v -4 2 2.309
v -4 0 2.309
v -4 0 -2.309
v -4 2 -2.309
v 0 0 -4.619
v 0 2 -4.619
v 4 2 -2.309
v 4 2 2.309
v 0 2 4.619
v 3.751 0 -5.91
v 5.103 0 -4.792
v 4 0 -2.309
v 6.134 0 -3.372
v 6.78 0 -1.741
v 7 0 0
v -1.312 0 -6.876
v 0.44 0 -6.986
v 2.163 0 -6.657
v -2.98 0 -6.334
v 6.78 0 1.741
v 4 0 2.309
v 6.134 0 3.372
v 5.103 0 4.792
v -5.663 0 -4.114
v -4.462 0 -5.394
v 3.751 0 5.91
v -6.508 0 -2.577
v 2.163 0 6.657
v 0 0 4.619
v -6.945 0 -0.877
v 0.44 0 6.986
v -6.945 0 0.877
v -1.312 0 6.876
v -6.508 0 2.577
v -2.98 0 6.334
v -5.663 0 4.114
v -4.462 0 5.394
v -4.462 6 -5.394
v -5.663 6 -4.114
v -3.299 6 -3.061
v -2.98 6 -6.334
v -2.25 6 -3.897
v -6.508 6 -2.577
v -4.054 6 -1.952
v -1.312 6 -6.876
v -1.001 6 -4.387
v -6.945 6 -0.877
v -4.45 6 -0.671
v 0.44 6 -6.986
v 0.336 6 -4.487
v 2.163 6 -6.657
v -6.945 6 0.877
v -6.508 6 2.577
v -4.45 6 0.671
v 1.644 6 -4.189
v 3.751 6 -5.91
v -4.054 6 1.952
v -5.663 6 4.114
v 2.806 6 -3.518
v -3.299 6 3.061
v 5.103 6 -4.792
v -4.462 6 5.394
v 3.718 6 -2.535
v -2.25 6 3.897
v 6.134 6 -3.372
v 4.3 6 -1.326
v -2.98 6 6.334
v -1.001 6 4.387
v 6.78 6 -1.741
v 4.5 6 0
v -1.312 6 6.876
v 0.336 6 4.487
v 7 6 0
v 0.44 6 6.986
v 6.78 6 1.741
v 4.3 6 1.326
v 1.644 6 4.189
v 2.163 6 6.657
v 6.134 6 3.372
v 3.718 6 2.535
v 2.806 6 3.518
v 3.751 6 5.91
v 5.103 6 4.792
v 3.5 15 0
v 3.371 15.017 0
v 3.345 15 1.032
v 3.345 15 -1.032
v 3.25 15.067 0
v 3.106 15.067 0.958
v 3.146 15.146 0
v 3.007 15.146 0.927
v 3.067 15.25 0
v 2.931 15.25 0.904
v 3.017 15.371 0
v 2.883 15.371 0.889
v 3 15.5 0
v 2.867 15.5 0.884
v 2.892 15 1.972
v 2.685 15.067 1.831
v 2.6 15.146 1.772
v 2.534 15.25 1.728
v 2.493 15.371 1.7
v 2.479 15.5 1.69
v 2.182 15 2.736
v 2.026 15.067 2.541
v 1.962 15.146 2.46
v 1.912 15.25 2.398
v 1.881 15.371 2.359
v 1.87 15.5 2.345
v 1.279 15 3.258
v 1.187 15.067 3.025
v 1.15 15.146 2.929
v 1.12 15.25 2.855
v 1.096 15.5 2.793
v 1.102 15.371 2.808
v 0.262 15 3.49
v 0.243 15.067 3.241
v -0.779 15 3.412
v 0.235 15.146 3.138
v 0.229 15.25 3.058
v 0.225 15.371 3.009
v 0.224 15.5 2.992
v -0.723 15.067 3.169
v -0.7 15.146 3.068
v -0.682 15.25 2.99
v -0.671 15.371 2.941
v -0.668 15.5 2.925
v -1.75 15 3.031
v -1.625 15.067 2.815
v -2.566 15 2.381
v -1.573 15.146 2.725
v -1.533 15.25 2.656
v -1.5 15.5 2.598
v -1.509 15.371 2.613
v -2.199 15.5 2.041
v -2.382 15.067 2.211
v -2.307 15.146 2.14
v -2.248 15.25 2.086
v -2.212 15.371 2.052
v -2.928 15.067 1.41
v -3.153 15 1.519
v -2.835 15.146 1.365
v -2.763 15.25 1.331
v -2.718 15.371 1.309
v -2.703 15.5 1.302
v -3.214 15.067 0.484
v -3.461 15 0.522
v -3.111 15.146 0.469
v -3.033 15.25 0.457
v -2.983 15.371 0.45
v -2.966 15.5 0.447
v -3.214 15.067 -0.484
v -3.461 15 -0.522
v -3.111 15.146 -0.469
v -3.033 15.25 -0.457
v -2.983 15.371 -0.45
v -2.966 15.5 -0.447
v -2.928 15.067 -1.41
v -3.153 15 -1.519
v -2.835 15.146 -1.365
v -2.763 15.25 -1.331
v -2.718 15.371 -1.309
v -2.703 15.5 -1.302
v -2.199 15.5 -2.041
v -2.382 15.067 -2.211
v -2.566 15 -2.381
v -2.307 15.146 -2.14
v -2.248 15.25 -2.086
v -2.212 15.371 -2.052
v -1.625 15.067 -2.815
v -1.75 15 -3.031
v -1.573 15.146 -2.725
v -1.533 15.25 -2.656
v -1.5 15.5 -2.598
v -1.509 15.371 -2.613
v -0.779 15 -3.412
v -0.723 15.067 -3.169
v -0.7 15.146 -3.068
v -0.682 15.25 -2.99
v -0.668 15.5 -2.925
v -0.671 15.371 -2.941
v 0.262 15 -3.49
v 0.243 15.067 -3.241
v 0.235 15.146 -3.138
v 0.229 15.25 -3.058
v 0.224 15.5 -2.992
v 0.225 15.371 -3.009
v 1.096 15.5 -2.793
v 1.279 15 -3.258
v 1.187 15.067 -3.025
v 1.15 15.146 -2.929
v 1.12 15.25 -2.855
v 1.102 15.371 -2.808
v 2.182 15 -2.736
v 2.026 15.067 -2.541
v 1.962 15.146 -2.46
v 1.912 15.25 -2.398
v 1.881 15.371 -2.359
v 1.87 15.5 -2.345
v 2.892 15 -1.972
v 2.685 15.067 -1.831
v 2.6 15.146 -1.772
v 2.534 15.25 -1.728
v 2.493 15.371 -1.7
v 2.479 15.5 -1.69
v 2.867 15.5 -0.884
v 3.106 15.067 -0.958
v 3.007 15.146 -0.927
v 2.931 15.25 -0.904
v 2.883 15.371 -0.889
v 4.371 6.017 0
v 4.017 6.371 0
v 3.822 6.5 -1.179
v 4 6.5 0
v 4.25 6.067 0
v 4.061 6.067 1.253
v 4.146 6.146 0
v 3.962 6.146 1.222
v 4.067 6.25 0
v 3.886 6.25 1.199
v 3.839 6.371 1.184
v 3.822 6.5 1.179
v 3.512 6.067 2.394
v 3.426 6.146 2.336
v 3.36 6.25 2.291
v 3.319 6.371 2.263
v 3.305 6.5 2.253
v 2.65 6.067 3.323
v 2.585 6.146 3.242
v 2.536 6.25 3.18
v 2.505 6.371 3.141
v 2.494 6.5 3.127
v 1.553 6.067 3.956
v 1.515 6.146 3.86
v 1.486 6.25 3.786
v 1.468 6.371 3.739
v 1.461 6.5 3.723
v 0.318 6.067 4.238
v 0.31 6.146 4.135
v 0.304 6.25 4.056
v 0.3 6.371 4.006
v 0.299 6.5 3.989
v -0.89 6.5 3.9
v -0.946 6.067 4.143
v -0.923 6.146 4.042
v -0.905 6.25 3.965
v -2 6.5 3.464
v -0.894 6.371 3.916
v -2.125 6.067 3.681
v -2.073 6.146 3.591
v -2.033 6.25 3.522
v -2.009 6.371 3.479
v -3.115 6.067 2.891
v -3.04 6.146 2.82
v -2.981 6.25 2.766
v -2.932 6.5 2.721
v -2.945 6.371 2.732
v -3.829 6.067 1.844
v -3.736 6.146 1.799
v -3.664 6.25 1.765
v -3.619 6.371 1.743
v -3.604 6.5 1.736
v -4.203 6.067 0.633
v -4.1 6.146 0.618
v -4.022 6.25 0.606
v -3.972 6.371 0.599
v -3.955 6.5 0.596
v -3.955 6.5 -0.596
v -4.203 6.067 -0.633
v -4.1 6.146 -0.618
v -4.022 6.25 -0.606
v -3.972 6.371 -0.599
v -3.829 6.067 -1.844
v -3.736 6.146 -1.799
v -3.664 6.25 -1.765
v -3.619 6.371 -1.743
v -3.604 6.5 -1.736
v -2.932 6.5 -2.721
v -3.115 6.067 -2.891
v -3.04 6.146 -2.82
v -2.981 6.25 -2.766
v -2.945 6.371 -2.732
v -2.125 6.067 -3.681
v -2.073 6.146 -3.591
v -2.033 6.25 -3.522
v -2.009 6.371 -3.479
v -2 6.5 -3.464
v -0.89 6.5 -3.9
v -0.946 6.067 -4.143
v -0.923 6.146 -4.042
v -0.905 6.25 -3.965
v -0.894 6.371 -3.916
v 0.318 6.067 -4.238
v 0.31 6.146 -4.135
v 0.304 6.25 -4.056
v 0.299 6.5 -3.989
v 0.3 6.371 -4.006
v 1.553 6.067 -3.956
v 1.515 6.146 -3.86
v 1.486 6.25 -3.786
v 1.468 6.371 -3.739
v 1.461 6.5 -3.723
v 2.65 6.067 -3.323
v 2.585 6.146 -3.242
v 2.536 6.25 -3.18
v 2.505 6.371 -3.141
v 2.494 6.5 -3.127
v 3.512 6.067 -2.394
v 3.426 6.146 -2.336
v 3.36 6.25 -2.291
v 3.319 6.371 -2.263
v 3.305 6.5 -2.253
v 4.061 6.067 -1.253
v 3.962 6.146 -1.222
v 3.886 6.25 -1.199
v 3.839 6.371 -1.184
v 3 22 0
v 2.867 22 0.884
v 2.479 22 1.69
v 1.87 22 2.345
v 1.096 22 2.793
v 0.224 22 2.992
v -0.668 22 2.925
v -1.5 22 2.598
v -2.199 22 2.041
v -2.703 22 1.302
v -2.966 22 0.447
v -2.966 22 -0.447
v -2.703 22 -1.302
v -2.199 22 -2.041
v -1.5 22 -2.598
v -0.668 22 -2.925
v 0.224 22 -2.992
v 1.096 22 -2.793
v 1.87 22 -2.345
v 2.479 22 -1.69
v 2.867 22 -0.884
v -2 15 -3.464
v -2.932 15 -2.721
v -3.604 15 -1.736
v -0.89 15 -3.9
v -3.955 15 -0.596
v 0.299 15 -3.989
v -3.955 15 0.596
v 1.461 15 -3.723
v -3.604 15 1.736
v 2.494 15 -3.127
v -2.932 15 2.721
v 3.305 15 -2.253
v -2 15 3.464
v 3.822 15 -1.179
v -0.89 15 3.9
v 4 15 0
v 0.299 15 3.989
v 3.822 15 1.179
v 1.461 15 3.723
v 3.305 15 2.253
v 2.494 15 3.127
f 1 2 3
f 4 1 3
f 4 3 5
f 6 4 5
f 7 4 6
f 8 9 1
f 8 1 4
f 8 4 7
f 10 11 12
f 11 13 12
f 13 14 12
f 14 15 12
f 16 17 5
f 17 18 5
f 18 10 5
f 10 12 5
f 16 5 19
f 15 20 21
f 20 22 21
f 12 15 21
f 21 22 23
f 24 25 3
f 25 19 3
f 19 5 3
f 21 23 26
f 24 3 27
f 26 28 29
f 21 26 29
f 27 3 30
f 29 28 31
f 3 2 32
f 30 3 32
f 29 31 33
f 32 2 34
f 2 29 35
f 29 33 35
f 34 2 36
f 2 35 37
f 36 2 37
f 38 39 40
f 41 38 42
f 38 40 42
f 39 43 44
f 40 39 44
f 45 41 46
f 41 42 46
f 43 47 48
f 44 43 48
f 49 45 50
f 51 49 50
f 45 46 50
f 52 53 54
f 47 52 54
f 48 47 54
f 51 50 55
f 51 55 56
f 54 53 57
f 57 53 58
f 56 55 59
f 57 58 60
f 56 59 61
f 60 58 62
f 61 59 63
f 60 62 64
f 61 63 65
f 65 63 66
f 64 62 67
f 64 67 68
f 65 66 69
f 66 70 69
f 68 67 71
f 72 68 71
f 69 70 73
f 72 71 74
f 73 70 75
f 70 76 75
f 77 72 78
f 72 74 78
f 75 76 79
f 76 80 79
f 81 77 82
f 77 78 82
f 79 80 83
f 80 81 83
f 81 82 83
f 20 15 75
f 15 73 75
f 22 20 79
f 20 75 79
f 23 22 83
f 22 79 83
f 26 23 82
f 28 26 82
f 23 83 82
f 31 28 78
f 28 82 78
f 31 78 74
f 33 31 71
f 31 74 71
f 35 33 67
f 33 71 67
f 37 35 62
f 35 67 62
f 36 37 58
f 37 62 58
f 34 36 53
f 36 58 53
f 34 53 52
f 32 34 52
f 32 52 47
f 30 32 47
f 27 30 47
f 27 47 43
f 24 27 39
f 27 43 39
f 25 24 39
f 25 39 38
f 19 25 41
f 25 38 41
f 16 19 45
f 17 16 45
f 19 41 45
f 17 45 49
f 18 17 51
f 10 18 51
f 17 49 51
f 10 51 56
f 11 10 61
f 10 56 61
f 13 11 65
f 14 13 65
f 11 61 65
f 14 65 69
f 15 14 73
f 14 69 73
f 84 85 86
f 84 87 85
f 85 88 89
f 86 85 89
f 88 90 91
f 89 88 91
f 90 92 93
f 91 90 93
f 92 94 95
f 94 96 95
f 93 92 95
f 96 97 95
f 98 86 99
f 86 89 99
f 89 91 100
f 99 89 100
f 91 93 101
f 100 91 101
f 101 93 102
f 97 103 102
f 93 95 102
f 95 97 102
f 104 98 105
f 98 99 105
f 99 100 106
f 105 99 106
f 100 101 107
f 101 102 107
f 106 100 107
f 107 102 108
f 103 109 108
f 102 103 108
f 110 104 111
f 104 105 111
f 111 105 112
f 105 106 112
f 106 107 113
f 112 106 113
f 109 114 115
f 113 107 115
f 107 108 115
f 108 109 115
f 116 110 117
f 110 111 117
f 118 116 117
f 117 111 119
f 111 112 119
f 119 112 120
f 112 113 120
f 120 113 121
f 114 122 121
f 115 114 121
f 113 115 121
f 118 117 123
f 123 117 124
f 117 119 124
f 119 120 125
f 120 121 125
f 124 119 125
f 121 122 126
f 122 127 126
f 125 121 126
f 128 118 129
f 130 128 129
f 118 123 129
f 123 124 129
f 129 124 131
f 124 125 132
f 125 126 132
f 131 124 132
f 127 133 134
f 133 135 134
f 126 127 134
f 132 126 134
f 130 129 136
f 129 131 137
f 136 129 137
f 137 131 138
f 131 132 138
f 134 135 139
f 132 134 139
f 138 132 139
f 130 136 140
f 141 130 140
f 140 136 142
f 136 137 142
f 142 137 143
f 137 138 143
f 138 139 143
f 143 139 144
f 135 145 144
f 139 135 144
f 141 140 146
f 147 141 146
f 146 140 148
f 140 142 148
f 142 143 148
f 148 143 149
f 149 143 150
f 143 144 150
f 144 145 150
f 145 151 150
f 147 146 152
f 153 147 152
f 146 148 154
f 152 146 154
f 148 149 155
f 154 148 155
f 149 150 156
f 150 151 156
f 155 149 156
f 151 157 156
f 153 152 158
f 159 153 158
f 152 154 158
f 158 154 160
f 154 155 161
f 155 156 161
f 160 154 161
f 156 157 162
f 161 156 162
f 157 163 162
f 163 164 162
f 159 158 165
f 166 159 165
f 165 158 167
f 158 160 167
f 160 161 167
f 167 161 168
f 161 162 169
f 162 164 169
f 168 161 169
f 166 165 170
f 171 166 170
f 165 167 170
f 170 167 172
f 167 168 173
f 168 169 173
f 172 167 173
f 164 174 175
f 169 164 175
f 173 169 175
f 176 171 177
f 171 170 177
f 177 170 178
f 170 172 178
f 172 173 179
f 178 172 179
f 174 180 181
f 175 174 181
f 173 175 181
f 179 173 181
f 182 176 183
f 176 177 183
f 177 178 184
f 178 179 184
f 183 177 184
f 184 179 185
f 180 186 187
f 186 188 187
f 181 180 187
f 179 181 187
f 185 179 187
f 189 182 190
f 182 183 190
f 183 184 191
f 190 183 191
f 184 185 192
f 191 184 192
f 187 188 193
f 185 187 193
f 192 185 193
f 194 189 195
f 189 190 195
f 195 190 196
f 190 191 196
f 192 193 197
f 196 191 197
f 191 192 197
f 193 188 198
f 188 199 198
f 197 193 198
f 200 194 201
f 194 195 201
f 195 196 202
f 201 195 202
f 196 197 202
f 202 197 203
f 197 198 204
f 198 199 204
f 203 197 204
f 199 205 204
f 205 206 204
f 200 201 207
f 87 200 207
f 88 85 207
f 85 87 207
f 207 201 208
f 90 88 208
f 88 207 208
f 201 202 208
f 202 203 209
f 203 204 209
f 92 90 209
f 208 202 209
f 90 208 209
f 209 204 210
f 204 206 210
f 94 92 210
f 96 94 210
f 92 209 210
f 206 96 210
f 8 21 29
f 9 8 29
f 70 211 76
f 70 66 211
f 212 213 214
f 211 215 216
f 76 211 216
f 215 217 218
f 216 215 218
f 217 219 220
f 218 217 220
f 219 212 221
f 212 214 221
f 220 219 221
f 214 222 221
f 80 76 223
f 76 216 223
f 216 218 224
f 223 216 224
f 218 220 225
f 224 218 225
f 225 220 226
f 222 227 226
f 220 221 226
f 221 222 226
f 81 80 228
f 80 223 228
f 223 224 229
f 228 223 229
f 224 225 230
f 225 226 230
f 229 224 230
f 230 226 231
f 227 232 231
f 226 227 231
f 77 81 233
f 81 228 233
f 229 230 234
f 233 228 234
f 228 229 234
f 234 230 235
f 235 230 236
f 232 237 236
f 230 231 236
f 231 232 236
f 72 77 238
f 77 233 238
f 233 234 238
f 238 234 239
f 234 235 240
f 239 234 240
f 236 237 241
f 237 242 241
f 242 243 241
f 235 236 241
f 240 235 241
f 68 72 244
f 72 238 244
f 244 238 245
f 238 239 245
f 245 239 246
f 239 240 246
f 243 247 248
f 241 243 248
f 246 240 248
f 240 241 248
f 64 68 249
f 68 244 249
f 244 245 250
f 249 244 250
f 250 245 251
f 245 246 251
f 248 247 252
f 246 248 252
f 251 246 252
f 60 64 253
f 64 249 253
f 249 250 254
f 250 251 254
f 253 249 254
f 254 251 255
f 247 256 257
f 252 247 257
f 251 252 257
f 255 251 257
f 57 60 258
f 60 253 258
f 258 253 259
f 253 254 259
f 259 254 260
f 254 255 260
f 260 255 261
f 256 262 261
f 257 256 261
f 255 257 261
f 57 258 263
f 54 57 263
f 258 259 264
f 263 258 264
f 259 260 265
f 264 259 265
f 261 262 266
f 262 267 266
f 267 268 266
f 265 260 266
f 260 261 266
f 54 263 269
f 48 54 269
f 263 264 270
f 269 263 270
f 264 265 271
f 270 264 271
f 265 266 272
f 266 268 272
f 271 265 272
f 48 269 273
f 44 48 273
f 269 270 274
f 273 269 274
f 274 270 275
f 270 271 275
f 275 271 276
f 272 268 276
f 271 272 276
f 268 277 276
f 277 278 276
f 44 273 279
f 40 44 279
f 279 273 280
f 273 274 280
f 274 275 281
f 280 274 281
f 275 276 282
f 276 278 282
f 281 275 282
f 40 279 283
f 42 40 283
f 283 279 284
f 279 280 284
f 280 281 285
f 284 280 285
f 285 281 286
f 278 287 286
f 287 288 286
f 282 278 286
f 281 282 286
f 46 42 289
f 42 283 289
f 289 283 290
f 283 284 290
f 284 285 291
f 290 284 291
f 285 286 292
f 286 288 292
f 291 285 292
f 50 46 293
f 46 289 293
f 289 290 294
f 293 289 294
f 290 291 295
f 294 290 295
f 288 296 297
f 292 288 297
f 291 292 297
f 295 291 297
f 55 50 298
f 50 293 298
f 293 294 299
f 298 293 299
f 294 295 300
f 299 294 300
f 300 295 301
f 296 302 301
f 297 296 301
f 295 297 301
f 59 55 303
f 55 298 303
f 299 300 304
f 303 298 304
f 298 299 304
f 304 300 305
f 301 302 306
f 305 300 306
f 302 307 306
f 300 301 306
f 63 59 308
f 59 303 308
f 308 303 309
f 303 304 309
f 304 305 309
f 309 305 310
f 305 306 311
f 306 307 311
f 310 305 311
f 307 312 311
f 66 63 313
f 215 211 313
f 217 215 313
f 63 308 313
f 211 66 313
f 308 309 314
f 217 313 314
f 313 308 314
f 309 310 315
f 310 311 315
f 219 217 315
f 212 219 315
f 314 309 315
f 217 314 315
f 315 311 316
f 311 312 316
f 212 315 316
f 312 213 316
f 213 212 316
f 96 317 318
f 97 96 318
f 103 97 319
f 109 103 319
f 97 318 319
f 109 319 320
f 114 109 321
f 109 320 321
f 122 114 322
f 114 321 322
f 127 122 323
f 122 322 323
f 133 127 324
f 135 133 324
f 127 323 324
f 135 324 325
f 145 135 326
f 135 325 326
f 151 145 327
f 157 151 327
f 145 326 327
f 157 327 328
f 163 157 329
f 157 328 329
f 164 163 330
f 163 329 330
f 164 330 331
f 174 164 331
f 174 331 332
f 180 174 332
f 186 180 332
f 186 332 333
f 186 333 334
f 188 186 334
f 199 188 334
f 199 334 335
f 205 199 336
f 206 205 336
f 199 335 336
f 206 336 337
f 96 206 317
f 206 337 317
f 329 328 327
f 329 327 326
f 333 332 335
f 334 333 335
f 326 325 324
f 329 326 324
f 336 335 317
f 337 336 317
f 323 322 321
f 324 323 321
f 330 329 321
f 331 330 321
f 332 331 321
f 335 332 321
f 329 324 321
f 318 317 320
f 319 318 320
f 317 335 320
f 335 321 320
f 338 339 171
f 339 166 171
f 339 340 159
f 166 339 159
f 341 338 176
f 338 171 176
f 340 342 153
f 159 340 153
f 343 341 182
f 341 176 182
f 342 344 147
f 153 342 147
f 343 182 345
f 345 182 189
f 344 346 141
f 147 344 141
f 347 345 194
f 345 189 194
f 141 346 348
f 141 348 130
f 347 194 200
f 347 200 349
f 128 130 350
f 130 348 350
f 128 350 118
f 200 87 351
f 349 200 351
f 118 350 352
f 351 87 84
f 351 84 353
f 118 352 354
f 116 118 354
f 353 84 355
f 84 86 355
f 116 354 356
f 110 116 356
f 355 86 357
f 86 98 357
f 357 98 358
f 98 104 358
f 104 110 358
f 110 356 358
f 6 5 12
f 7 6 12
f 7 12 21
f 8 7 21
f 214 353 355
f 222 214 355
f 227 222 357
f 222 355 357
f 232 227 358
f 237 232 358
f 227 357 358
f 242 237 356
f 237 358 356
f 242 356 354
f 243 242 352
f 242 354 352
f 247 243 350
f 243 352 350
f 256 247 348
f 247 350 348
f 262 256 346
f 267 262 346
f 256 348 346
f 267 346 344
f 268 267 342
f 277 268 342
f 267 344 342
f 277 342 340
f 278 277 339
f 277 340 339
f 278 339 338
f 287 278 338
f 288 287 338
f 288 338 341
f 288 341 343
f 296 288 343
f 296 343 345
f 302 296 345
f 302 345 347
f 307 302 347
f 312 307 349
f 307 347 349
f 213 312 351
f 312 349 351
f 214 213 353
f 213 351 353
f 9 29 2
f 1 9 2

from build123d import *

# Parameters (mm, degrees)
CUT_EXTRUDE1_DEPTH = 2
FILLET1_R          = 0.5
FILLET2_R          = 0.5


with BuildPart() as part:
    # Sketch1 → Revolve1 (revolve)
    with BuildSketch(Plane.XY):
        Polygon((0, 0), (7, 0), (7, 6), (4, 6), (4, 15), (3, 15), (3, 22), (0, 22), align=None)
    revolve(axis=Axis((0, 22, 0), (0, -1, 0)))

    # Sketch2 → Cut-Extrude1 (cut)
    with BuildSketch(Plane.XZ):
        Polygon((0, -4.618802154), (4, -2.309401077), (4, 2.309401077), (0, 4.618802154), (-4, 2.309401077), (-4, -2.309401077), align=None)
    extrude(amount=-CUT_EXTRUDE1_DEPTH, mode=Mode.SUBTRACT)

    # Fillet1
    fillet1_edges = [part.edges().sort_by_distance(p)[0] for p in [
        (-4, 6, 0),
    ]]
    fillet(fillet1_edges, radius=FILLET1_R)

    # Fillet2
    fillet2_edges = [part.edges().sort_by_distance(p)[0] for p in [
        (-3, 15, 0),
    ]]
    fillet(fillet2_edges, radius=FILLET2_R)


solid = part.part
